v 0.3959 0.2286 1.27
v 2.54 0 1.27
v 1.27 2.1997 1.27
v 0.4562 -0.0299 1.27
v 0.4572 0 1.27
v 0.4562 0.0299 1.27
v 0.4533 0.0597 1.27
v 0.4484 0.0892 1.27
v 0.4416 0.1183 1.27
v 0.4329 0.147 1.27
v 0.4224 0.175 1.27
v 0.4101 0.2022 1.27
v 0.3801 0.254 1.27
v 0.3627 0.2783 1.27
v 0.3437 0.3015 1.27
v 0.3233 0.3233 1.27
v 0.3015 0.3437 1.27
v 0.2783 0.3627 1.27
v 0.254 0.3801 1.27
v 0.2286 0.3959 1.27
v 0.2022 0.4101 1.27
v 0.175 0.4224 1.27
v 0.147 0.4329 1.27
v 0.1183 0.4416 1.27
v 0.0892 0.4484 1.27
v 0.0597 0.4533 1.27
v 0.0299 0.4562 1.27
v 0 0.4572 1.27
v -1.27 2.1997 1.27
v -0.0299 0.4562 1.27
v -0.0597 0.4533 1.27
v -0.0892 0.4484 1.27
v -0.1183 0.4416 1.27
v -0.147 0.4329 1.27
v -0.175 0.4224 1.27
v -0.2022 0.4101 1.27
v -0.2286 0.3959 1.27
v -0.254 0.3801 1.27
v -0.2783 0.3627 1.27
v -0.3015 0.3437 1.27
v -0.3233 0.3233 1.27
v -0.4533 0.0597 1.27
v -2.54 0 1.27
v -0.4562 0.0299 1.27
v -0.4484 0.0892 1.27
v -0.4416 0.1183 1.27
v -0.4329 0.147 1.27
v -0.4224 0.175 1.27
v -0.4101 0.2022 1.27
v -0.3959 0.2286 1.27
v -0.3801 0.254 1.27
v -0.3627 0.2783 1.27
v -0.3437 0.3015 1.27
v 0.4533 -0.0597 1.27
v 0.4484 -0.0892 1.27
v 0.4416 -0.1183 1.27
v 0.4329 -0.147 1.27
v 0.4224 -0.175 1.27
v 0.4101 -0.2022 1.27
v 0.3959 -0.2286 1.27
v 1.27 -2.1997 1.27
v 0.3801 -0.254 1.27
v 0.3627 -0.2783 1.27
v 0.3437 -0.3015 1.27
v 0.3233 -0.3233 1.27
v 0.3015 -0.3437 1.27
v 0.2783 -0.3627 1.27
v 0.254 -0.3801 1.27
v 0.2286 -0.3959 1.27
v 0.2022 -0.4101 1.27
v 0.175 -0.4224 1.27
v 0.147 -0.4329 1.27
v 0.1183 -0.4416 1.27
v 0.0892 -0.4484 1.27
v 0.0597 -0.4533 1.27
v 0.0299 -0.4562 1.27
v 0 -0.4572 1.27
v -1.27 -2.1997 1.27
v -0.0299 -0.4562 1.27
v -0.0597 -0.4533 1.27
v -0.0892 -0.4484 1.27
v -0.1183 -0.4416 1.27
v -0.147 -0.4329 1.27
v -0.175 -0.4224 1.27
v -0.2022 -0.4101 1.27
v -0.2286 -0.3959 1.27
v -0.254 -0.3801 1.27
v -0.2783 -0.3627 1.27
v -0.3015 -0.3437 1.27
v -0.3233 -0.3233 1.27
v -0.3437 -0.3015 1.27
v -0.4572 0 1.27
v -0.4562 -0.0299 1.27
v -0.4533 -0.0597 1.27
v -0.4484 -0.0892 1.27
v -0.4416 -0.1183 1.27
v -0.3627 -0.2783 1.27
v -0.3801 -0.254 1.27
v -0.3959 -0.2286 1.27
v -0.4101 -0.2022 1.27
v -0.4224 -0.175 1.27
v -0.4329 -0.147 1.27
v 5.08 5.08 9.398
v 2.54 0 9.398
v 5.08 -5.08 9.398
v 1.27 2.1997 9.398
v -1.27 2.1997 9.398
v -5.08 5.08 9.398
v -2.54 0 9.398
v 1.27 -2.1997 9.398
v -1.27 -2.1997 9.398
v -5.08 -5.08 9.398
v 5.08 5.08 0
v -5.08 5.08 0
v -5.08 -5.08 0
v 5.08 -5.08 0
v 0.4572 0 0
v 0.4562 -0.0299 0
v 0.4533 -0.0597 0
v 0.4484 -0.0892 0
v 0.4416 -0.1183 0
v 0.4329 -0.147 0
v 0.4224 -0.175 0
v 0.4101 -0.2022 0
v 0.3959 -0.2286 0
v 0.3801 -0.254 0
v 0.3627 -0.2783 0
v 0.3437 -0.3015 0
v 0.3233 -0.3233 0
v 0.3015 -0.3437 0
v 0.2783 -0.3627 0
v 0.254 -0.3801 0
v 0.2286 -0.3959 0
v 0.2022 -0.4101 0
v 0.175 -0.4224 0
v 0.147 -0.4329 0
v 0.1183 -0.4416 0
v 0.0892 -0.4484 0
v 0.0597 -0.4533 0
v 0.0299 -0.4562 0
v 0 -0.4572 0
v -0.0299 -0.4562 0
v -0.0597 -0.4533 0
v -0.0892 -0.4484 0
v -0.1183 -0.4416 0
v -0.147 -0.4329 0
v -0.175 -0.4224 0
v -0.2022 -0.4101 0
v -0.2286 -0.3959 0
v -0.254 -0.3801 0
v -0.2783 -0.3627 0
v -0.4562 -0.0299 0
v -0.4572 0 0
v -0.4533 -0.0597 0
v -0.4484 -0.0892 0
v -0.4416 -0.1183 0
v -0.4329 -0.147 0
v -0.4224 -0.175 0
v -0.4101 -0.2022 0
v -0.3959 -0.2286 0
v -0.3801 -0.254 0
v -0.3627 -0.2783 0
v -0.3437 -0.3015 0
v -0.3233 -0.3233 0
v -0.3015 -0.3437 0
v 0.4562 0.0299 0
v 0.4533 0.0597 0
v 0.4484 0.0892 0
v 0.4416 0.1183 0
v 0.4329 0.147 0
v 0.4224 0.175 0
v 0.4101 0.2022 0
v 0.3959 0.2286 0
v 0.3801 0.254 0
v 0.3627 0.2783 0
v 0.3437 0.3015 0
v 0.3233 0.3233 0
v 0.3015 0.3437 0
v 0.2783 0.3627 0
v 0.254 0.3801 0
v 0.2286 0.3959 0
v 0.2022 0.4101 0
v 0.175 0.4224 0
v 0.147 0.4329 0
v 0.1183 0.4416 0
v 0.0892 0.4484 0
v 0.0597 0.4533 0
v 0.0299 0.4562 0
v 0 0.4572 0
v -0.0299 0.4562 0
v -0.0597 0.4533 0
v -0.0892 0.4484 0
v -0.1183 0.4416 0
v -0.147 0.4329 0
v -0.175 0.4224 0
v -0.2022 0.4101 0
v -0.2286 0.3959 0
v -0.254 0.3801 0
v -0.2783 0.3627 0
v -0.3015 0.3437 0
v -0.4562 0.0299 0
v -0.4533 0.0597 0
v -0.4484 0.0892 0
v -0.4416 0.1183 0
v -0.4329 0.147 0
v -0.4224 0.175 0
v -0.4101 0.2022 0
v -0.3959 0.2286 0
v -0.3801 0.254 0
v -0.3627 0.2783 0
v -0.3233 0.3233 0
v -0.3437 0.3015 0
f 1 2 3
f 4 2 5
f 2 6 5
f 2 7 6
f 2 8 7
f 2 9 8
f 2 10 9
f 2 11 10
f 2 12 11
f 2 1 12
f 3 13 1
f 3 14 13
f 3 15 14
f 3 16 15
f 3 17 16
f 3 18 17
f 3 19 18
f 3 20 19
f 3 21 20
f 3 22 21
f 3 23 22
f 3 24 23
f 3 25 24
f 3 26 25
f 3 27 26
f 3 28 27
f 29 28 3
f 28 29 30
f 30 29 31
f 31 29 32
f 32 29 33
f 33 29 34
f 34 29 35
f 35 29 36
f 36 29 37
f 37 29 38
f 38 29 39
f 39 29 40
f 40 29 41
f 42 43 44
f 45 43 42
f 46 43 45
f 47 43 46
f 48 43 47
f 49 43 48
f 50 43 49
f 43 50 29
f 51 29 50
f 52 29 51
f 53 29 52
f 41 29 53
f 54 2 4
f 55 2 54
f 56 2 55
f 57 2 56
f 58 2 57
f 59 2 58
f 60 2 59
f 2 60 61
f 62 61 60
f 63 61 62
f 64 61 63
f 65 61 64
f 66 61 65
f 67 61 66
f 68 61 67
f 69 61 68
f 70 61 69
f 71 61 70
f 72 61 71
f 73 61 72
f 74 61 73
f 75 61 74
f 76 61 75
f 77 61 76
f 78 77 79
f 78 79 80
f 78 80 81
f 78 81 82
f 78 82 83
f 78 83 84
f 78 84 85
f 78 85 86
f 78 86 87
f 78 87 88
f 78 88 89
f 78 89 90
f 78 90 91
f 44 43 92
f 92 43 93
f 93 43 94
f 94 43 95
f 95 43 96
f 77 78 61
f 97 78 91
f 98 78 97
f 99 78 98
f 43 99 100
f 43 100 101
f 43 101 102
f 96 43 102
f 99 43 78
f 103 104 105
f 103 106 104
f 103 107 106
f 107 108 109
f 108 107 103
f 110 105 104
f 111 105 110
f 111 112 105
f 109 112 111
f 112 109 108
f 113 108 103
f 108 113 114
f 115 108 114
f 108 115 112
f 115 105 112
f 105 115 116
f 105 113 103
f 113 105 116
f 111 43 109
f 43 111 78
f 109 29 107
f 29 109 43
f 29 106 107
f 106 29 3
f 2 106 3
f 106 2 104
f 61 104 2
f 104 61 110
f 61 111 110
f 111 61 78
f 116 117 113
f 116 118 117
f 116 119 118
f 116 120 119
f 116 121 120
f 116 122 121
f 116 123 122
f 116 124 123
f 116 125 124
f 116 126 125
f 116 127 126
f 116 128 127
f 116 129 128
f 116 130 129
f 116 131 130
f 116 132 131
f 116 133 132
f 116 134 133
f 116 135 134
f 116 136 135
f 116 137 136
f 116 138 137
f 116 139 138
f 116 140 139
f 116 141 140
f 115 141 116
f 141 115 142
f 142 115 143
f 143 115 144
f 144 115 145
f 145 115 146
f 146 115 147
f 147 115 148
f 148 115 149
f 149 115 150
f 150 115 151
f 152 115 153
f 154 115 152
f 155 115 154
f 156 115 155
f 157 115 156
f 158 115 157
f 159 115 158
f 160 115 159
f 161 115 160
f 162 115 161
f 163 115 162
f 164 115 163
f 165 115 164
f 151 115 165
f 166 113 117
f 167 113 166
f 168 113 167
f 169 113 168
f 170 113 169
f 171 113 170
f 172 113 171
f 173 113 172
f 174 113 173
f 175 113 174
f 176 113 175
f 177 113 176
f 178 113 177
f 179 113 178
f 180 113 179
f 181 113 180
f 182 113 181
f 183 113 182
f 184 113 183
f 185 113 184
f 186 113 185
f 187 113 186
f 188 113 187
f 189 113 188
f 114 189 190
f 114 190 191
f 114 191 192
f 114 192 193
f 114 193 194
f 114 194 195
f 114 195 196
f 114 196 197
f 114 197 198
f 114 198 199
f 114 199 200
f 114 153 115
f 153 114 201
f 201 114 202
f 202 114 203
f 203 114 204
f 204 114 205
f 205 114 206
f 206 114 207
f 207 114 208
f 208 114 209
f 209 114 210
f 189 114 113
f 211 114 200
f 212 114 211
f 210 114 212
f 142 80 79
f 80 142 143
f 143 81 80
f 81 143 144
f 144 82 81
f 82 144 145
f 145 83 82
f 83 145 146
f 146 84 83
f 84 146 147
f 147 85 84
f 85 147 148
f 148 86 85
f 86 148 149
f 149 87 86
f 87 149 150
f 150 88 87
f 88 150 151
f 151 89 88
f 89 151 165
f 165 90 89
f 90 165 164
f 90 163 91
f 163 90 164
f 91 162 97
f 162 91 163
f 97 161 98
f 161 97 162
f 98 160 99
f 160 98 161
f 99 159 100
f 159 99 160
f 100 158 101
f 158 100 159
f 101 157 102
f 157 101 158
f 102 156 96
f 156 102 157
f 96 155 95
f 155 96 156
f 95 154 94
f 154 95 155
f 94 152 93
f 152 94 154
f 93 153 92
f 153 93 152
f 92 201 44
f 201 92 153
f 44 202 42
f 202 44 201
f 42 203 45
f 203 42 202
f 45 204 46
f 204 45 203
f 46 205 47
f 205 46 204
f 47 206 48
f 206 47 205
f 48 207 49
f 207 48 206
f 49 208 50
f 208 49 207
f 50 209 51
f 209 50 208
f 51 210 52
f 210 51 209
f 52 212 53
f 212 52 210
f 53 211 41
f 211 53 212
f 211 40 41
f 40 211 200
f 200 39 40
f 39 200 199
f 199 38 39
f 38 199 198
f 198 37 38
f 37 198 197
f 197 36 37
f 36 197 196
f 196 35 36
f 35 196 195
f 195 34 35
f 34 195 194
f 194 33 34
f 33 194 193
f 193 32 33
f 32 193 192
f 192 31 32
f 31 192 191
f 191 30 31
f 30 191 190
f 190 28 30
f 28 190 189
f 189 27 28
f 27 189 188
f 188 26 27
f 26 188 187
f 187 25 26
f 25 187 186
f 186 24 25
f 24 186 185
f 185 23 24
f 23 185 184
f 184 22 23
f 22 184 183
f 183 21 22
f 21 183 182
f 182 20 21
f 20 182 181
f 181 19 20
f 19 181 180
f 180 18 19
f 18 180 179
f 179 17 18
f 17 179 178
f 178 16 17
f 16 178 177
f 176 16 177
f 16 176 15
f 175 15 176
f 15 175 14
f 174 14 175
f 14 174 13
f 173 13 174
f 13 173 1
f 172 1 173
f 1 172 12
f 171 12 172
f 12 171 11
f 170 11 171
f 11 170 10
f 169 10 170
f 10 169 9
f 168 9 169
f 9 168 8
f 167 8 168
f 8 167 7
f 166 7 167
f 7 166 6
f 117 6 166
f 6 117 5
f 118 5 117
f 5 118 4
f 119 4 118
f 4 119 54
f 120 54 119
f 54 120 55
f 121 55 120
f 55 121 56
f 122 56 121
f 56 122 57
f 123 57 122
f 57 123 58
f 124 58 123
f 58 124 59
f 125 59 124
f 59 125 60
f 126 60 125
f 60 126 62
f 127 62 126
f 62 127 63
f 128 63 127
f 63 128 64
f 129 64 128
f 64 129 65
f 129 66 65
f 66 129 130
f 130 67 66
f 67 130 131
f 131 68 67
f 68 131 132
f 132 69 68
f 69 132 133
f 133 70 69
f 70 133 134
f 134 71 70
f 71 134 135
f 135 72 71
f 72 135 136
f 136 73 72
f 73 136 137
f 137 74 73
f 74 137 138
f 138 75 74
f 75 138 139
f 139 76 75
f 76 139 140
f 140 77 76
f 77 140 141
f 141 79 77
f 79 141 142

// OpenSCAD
// file: defs.scad
RealityScale = [1.27, 1.27, 1.27];
ViewScale = [0.0254, 0.0254, 0.0254];
JointVertSpace=20;
LayerUnit=300;
SpacedLayer=LayerUnit+JointVertSpace;
JointR = 400;
ShaftR = 200;
ShaftHole=220;
ShaftTight=230; // wood PLA
//ShaftTight=205; plastic PLA
HexTight=210;
MagicMult = 50;
StrutWidth = 400;
rrectR = 100;
ShaftSleeve = 200;

// Spine Horizontal
MagicA = MagicMult * 38;
// Spine Verticial
MagicL = MagicMult * 7.8;

// Leg Triangle
MagicG = MagicMult * 36.7; // a
MagicH = MagicMult * 65.7; // c
MagicI = MagicMult * 49;   // b

// Driver Triangle
MagicB = MagicMult * 41.5;
MagicD = MagicMult * 40.1;
MagicE = MagicMult * 55.8;

// Front Strut
MagicC = MagicMult * 39.3;
FsLen = MagicC;

// Back Strut
MagicF = MagicMult * 39.4;
BsLen = MagicF;

// Lower Driver Strut
MagicK = MagicMult * 61.9;

// Upper Driver Strut
MagicJ = MagicMult * 50;

// Cam radius
MagicM = MagicMult * 15;

spineLength = sqrt(pow(MagicA, 2) + pow(MagicL,2));
// main file
include <defs.scad>

scale(ViewScale)
{
    // insert
    //linear_extrude(600)
    //circle(90, $fn=6);

    translate([0, 0, 50])
    linear_extrude(320)
    difference() {
    square([400, 400], center=true);
    circle(100, $fn=6);
    }

    linear_extrude(50)
    difference() {
    square([400, 400], center=true);
    circle(18, $fn=96);
    }


}
